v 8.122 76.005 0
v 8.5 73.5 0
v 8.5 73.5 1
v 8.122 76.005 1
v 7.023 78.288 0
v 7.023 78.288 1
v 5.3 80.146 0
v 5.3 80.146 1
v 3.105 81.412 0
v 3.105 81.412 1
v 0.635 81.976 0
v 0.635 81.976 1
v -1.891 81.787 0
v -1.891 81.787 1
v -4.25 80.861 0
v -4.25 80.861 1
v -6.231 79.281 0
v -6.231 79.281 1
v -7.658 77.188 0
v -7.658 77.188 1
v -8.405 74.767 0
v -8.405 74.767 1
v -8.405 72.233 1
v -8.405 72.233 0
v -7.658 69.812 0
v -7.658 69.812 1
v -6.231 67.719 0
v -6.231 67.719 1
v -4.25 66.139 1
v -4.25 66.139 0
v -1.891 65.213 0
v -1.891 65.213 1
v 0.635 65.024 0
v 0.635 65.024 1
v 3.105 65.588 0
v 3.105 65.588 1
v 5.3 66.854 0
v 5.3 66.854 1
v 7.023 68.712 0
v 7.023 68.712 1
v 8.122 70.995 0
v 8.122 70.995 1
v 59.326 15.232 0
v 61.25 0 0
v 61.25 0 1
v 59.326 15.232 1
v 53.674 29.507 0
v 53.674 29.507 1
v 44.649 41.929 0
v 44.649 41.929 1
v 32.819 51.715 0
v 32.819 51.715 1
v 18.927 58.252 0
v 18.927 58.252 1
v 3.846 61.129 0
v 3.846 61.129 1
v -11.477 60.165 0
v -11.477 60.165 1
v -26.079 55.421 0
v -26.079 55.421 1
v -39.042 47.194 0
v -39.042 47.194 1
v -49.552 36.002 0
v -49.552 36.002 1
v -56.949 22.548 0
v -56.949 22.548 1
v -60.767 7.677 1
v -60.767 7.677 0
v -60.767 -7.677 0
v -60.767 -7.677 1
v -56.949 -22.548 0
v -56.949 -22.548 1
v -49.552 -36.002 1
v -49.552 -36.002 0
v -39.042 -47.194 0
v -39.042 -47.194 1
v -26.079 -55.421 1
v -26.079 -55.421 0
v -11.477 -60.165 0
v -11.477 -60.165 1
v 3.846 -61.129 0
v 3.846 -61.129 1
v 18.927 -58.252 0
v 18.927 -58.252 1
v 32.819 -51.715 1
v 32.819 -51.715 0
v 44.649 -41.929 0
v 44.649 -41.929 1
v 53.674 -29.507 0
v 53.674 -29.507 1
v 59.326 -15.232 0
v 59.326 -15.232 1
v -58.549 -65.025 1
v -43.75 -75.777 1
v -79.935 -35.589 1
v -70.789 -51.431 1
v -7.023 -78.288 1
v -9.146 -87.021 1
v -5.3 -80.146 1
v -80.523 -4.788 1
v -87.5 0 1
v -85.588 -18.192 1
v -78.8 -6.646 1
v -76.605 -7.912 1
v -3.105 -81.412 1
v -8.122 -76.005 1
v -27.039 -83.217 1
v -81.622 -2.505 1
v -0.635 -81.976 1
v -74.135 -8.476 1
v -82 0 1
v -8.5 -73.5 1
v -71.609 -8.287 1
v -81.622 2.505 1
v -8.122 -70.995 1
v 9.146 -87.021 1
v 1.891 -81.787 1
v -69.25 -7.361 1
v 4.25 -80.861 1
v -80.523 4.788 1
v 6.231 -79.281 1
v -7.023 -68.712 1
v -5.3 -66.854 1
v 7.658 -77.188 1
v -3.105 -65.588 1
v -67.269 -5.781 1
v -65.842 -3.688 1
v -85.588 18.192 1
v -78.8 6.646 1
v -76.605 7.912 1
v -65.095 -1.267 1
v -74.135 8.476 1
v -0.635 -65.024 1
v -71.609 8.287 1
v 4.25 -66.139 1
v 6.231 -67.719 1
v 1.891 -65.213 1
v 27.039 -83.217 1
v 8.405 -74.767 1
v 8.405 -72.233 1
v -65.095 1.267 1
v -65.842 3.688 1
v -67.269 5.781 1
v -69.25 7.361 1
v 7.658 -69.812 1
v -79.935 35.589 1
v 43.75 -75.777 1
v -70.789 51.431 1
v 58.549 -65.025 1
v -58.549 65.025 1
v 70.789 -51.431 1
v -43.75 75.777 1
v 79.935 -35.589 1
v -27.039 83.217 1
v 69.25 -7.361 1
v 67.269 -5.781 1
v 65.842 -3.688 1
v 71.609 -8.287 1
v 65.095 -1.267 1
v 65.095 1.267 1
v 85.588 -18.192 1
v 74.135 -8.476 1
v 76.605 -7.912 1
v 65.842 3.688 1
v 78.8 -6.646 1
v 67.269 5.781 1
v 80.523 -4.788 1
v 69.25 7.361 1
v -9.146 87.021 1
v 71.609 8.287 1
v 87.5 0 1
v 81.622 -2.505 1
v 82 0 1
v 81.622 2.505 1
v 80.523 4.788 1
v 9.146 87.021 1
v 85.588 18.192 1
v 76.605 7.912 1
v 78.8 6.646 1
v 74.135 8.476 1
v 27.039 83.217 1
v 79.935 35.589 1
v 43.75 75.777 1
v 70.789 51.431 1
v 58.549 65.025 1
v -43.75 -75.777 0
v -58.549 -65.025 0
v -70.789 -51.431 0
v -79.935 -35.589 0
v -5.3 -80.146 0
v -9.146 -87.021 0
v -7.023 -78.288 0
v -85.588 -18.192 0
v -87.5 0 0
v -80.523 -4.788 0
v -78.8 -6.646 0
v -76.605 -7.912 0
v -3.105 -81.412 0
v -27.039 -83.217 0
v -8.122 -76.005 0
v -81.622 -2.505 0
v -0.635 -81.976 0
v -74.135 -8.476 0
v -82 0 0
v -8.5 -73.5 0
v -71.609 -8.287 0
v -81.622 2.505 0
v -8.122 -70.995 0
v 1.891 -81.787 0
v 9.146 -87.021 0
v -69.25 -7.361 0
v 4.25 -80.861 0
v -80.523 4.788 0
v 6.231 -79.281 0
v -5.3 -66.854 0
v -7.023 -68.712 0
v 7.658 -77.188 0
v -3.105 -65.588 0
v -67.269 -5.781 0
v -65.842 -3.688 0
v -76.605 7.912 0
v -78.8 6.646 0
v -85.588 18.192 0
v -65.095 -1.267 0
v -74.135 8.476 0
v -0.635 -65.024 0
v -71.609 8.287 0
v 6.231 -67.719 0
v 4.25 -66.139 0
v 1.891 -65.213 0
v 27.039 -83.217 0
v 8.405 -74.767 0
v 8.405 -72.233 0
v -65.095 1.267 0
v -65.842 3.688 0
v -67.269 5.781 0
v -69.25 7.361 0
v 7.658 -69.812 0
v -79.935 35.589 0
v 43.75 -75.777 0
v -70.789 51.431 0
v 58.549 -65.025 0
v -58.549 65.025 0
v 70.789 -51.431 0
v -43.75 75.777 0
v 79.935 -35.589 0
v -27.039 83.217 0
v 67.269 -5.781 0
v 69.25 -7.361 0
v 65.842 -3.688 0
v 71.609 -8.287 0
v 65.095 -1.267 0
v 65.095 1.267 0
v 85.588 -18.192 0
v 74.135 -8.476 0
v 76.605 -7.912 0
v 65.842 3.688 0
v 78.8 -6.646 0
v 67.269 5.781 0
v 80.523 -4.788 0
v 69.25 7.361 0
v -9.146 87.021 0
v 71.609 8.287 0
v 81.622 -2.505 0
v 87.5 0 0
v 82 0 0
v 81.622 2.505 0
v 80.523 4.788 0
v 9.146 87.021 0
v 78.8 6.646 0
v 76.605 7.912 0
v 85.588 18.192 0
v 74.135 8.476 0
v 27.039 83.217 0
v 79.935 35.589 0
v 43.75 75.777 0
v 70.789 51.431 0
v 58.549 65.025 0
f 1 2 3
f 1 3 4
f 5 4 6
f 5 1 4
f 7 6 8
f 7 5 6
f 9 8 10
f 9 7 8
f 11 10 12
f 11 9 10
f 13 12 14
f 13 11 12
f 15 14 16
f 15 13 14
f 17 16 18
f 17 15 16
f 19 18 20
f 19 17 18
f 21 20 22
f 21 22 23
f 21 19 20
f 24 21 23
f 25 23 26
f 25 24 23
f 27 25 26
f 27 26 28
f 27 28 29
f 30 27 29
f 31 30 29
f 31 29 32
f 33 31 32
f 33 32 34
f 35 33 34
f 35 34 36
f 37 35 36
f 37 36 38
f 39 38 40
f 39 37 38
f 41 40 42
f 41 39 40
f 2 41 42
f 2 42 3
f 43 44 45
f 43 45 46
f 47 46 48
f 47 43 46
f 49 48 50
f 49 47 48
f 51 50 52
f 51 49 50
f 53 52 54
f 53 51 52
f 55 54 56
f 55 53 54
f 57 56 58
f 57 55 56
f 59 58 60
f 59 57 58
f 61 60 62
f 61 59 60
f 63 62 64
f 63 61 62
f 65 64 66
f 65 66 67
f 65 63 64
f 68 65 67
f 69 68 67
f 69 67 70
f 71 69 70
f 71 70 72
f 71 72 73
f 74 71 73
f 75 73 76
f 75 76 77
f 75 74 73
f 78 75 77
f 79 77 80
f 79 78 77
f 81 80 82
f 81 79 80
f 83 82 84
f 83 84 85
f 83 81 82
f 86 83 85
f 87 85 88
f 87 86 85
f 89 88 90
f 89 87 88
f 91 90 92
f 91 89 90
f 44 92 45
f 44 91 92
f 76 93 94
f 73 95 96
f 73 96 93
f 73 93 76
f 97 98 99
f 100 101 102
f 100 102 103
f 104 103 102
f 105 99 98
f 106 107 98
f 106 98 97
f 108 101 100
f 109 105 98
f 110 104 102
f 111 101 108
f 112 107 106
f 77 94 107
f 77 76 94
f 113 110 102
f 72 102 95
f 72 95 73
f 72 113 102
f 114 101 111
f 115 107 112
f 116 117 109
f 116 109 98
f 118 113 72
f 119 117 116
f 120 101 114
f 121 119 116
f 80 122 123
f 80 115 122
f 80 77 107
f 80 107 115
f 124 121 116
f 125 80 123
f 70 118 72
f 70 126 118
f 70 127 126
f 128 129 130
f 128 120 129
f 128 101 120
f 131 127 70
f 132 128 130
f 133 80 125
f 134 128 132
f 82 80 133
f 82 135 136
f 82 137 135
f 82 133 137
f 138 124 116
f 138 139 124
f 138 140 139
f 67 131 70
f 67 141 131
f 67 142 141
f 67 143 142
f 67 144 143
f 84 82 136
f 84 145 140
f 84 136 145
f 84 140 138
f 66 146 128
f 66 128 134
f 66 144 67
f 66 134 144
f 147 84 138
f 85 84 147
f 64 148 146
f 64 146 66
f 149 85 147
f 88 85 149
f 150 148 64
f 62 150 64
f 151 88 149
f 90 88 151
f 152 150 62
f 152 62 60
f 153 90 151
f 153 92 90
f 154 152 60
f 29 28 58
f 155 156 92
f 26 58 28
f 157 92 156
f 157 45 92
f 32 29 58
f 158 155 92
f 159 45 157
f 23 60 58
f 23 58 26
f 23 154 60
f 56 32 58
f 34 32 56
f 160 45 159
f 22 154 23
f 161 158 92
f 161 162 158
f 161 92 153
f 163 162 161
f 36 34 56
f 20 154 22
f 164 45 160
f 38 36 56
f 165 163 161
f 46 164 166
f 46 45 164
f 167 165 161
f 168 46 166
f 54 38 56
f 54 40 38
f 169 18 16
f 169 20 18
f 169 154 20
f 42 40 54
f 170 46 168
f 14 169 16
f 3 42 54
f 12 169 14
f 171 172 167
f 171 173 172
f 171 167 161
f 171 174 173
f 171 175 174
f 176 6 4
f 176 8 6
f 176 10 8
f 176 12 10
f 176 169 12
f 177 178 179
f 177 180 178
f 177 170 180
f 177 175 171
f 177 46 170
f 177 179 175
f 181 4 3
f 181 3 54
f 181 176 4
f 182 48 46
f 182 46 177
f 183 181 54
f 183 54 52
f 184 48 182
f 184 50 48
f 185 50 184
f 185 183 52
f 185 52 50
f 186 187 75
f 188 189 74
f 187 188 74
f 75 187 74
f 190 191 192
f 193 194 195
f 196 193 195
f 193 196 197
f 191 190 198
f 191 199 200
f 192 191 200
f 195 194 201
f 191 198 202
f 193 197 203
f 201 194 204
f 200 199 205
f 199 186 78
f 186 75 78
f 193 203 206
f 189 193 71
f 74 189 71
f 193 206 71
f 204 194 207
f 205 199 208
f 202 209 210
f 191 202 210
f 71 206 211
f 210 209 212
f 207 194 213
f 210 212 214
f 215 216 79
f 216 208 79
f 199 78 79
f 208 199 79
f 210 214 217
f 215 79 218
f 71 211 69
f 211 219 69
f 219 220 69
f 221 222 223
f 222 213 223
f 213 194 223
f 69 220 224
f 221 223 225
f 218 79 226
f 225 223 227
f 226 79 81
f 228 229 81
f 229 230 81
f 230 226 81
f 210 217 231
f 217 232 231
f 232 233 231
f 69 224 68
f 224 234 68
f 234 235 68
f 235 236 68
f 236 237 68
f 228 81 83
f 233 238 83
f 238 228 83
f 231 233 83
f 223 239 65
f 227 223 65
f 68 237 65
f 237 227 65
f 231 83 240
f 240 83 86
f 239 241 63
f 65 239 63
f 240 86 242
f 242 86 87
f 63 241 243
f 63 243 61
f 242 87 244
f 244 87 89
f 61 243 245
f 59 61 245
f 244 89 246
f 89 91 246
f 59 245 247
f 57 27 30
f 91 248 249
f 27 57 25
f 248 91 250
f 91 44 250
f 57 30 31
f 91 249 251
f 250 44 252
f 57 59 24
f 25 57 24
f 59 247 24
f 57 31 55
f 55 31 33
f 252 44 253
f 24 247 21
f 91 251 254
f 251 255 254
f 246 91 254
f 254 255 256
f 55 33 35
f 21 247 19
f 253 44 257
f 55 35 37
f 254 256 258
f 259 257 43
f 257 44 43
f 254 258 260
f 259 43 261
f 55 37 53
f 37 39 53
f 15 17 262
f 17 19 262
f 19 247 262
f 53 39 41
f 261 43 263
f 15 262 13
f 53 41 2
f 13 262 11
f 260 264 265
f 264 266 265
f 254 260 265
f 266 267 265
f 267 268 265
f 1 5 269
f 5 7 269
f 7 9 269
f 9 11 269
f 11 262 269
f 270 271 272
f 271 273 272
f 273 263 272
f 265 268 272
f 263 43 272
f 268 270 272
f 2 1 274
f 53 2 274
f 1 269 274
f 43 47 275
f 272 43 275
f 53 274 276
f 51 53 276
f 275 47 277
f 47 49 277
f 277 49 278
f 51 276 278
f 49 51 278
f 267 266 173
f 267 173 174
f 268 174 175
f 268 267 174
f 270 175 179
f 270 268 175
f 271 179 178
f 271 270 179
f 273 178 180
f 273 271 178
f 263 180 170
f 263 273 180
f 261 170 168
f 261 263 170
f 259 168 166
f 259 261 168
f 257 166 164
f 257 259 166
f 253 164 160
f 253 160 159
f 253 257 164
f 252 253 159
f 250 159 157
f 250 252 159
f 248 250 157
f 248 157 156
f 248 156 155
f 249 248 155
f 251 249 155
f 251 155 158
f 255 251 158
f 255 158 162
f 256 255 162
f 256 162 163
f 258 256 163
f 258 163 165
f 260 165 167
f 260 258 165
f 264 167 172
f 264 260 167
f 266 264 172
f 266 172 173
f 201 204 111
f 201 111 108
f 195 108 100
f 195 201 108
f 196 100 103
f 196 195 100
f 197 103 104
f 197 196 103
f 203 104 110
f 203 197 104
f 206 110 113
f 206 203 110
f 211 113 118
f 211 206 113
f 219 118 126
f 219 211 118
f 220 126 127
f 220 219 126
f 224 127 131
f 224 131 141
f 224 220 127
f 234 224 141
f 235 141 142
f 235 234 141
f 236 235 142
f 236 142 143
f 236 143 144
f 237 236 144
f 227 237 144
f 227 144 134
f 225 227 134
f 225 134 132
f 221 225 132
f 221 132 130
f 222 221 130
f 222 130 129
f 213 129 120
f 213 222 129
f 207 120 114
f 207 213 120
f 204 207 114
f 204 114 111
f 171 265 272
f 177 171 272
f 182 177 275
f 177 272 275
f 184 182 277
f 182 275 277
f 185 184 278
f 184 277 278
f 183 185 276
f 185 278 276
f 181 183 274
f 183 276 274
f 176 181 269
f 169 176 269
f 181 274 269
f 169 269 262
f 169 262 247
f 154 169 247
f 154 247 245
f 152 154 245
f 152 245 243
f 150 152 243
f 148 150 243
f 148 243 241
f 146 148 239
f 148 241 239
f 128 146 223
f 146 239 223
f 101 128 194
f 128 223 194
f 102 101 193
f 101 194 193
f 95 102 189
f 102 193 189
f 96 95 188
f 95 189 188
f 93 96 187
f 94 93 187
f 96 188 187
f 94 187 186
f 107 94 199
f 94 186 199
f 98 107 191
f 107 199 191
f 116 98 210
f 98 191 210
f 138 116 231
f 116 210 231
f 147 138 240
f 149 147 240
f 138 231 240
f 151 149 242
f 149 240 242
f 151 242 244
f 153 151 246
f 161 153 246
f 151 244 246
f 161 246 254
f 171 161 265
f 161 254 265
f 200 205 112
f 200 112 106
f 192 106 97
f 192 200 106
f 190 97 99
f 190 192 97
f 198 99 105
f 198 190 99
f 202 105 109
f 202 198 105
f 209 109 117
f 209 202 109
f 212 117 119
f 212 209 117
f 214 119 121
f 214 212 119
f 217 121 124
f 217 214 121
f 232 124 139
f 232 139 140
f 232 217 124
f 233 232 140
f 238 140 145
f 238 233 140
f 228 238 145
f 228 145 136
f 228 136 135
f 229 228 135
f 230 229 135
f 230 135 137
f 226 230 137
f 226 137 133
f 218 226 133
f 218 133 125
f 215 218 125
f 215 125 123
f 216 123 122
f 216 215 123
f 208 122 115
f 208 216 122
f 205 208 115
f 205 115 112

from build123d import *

# Parameters (mm, degrees)
SKETCH1_R           = 87.5
SKETCH1_R_2         = 8.5
SKETCH1_R_3         = 61.25
BOSS_EXTRUDE1_DEPTH = 1


with BuildPart() as part:
    # Sketch1 → Boss-Extrude1 (new body)
    with BuildSketch(Plane.XY):
        Circle(SKETCH1_R)
        with Locations((0, 73.5)):
            Circle(SKETCH1_R_2, mode=Mode.SUBTRACT)
        with Locations((73.5, 0)):
            Circle(SKETCH1_R_2, mode=Mode.SUBTRACT)
        with Locations(Location((-73.5, 0, 0), (0, 0, 180))):
            Circle(SKETCH1_R_2, mode=Mode.SUBTRACT)
        with Locations(Location((0, -73.5, 0), (0, 0, 180))):
            Circle(SKETCH1_R_2, mode=Mode.SUBTRACT)
        Circle(SKETCH1_R_3, mode=Mode.SUBTRACT)
    extrude(amount=BOSS_EXTRUDE1_DEPTH)


solid = part.part
